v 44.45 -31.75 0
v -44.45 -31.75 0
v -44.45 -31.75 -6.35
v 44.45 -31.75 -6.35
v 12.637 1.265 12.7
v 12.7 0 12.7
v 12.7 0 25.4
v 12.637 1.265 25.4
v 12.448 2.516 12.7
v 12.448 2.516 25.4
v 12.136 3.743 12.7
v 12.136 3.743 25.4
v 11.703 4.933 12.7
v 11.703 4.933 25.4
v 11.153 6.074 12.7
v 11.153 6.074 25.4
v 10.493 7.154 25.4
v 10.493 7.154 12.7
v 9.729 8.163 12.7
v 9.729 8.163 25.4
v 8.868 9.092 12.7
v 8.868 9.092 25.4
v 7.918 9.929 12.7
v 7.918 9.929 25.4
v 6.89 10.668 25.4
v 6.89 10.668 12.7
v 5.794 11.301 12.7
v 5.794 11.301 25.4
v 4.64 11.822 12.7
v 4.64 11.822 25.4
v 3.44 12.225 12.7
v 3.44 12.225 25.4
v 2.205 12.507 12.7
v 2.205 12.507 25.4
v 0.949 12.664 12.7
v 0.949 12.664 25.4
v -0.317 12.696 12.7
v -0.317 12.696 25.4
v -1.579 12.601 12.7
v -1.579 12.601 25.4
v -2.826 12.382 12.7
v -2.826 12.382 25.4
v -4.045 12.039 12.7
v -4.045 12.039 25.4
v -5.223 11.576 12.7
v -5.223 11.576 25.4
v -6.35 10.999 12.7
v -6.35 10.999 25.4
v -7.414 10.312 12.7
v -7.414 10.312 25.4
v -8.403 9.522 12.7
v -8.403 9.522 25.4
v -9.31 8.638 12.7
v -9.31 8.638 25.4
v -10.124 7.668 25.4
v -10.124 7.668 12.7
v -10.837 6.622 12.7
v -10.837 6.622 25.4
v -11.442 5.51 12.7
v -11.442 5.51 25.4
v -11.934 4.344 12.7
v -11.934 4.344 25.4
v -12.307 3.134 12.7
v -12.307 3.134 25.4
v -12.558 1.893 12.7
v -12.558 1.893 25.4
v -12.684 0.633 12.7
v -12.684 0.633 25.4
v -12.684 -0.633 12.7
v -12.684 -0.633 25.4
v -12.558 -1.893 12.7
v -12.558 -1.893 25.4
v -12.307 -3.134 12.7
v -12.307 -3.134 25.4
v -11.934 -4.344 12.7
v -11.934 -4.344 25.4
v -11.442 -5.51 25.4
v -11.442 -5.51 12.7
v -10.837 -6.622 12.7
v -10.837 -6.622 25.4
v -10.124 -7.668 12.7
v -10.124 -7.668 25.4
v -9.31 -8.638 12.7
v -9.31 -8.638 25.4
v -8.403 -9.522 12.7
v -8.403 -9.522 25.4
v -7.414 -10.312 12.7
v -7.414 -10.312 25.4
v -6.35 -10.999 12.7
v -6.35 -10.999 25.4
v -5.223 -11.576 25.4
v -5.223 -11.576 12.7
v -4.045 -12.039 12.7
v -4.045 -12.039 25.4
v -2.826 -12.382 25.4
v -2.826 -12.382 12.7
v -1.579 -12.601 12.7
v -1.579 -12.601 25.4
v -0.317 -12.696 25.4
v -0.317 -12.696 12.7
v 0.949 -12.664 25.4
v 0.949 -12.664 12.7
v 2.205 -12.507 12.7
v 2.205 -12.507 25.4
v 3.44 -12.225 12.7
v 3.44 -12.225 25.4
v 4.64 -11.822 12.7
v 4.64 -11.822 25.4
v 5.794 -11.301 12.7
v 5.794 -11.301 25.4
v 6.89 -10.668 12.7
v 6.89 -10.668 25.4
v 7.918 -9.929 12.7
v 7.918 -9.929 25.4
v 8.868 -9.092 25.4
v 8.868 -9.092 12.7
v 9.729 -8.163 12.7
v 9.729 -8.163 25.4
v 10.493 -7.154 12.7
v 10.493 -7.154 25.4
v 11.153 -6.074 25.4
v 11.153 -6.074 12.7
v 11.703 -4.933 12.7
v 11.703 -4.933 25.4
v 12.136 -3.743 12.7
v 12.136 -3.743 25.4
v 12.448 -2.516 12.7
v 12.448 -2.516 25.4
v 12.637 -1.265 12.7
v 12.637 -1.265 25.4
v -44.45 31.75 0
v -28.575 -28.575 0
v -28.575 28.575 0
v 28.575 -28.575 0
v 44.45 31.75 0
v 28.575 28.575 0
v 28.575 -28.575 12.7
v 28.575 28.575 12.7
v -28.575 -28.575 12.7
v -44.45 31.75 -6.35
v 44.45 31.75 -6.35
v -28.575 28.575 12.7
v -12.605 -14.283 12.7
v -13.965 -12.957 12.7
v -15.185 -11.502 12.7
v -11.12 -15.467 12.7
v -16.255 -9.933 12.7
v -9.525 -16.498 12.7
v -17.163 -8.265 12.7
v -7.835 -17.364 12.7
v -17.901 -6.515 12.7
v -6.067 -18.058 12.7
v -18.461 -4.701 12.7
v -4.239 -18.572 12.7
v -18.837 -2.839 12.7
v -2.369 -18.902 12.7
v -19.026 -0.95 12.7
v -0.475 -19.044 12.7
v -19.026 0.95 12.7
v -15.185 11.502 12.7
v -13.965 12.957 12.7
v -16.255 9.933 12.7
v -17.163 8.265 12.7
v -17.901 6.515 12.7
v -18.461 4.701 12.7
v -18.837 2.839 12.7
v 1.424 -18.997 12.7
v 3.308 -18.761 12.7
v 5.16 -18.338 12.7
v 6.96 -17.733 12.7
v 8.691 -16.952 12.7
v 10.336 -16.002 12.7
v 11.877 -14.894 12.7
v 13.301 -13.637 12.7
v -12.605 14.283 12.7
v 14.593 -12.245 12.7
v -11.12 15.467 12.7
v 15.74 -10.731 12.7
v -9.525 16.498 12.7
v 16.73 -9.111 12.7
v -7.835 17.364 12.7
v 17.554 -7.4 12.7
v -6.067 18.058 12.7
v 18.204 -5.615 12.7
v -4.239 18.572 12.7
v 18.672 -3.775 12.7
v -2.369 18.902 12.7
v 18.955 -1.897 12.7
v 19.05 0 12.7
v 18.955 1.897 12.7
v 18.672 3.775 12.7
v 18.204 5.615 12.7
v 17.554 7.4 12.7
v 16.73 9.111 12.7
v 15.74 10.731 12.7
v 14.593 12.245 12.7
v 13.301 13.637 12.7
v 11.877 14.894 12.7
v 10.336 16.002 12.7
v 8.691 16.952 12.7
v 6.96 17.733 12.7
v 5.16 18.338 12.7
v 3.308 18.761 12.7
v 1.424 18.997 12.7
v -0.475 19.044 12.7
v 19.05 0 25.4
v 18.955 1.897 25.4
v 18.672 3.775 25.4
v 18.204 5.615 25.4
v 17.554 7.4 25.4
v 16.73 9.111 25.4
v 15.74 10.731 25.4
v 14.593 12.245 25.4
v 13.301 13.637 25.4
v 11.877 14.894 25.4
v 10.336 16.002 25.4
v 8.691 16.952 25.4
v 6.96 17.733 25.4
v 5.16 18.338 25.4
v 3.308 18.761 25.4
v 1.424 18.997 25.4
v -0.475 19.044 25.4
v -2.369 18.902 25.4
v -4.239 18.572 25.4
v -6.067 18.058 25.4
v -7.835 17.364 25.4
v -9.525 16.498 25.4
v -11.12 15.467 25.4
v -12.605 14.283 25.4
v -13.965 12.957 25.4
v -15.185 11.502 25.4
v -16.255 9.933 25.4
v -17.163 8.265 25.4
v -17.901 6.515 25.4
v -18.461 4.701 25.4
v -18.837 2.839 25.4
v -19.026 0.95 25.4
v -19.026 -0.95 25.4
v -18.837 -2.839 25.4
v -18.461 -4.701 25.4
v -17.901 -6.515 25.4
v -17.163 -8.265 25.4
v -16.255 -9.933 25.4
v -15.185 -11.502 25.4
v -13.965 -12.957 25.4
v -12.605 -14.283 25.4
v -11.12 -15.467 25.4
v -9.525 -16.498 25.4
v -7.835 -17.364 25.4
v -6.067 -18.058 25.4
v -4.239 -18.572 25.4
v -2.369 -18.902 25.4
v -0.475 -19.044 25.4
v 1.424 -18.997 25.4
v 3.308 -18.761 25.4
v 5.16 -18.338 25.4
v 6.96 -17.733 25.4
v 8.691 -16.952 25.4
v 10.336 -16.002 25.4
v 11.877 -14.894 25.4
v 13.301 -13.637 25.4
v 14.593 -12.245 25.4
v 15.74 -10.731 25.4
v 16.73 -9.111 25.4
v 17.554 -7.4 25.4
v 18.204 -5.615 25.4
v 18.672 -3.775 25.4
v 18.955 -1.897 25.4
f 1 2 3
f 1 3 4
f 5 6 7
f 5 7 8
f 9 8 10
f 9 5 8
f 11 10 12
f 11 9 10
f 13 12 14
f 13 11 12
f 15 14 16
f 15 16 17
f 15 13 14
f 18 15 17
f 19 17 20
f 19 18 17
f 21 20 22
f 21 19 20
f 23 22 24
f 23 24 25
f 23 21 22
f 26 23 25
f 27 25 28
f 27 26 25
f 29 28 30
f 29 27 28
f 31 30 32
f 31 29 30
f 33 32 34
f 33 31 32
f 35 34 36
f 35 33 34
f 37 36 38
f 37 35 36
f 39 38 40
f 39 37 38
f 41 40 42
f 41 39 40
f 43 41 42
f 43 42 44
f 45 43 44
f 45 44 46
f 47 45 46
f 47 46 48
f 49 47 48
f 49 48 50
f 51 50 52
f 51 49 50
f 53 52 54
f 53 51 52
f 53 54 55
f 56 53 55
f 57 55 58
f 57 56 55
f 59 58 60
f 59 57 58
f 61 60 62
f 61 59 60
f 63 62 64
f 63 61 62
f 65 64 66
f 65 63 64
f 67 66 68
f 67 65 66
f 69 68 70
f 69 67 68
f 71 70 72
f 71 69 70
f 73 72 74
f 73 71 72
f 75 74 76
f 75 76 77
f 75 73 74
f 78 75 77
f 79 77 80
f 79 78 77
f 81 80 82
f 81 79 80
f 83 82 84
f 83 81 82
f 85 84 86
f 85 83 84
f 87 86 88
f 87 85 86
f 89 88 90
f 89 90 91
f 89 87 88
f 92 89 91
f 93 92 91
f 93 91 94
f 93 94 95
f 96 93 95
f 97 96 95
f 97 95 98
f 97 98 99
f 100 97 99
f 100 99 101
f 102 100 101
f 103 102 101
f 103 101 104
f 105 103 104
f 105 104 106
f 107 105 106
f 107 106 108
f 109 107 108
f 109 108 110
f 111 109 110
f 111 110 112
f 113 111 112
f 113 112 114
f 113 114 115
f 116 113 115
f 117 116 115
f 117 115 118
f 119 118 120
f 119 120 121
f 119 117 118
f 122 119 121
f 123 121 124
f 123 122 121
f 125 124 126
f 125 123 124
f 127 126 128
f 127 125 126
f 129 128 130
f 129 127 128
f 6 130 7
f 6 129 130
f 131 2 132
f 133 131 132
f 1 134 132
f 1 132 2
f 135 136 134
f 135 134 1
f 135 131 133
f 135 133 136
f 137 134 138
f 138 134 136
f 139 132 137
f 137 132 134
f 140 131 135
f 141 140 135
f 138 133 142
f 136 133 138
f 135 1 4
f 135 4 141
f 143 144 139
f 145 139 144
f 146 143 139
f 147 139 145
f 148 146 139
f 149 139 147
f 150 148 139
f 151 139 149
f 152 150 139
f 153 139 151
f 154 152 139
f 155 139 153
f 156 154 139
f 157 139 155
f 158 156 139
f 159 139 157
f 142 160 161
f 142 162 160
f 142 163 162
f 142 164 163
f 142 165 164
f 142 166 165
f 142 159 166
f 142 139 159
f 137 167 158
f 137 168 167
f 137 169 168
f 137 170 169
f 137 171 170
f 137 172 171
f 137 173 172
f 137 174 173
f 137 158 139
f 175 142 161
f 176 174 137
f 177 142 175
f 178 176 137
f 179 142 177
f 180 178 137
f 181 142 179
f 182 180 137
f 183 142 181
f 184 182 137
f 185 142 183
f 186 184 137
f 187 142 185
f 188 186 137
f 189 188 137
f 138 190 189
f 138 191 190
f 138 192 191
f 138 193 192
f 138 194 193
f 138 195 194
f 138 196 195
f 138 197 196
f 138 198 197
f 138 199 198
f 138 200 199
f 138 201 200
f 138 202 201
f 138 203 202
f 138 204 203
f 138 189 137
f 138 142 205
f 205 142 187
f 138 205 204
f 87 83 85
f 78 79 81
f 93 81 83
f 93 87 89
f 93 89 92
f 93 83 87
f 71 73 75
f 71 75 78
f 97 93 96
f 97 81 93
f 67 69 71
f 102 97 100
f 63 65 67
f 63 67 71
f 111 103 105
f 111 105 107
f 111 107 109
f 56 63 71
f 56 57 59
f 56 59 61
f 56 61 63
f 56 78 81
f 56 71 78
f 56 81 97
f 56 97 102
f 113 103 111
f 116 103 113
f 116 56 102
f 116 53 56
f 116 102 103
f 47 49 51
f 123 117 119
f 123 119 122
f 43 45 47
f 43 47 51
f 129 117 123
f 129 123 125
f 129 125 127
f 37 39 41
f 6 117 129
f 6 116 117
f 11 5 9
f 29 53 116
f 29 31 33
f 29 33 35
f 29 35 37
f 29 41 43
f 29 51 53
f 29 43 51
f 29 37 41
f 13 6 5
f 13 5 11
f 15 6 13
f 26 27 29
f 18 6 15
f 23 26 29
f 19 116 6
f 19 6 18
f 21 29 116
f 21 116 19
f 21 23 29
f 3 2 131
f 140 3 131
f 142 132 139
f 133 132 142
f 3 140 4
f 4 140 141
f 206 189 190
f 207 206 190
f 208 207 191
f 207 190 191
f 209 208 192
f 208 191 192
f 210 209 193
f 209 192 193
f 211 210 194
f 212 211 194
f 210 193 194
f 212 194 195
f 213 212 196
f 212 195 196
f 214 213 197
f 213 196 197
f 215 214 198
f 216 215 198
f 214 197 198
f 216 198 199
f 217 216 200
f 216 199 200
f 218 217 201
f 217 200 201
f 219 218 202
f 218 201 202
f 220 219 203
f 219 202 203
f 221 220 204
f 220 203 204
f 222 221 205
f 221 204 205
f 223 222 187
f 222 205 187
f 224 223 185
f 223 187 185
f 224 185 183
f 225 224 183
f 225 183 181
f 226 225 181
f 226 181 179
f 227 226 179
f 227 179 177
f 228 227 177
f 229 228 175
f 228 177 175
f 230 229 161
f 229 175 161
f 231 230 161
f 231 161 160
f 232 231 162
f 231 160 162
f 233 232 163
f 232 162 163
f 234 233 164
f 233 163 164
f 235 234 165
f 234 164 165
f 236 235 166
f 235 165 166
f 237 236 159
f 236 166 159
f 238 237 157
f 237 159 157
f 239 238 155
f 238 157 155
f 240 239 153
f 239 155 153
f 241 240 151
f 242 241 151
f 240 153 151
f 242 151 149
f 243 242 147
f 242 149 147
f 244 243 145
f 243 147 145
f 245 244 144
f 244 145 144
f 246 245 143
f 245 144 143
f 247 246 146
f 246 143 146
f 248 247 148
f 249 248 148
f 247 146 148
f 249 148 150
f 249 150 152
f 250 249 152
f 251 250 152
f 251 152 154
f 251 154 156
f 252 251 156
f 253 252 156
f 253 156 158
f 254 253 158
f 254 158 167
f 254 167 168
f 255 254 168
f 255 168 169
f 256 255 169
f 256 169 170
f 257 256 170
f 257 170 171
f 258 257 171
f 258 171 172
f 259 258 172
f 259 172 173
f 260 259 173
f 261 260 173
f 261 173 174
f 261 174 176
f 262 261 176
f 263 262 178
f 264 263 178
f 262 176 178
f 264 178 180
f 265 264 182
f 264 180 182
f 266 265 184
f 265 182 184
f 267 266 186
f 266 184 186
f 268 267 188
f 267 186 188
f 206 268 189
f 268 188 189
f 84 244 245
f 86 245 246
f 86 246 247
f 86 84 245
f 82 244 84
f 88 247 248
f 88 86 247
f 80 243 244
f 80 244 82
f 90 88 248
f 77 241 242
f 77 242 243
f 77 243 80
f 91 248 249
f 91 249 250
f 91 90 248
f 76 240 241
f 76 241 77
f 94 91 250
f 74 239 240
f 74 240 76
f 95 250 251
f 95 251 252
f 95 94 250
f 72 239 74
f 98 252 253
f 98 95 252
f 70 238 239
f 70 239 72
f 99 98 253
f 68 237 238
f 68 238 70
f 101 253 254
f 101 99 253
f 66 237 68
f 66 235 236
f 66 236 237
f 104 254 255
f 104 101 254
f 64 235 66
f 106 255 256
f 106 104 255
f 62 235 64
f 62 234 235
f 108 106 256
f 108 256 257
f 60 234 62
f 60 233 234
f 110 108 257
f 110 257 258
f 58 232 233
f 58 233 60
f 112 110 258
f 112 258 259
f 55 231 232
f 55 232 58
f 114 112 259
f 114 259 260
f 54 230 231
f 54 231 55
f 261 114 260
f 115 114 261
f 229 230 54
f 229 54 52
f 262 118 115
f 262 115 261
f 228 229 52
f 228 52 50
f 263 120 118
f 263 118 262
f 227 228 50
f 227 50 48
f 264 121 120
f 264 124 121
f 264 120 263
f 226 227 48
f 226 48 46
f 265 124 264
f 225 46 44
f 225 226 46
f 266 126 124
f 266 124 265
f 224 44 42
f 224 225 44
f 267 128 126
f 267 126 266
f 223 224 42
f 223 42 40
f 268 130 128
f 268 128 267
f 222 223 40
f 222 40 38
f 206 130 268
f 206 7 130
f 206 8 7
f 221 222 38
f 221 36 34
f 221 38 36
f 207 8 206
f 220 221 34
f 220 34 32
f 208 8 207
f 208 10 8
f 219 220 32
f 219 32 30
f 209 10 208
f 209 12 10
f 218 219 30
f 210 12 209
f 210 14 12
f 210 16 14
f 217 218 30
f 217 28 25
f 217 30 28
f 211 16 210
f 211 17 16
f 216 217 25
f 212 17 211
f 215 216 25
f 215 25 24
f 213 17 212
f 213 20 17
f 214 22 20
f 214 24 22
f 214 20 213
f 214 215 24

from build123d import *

# Parameters (mm, degrees)
SKETCH2_W           = 88.9
SKETCH2_H           = 63.5
BOSS_EXTRUDE1_DEPTH = 6.35
SKETCH3_W           = 57.15
SKETCH3_H           = 57.15
BOSS_EXTRUDE2_DEPTH = 12.7
SKETCH4_R           = 19.05
SKETCH4_R_2         = 12.7
BOSS_EXTRUDE3_DEPTH = 12.7


with BuildPart() as part:
    # Sketch2 → Boss-Extrude1 (new body)
    with BuildSketch(Plane.XY):
        Rectangle(SKETCH2_W, SKETCH2_H)
    extrude(amount=-BOSS_EXTRUDE1_DEPTH)

    # Sketch3 → Boss-Extrude2 (add)
    with BuildSketch(Plane.XY):
        Rectangle(SKETCH3_W, SKETCH3_H)
    extrude(amount=BOSS_EXTRUDE2_DEPTH)

    # Sketch4 → Boss-Extrude3 (add)
    with BuildSketch(Plane.XY.offset(12.7)):
        Circle(SKETCH4_R)
        Circle(SKETCH4_R_2, mode=Mode.SUBTRACT)
    extrude(amount=BOSS_EXTRUDE3_DEPTH)


solid = part.part
